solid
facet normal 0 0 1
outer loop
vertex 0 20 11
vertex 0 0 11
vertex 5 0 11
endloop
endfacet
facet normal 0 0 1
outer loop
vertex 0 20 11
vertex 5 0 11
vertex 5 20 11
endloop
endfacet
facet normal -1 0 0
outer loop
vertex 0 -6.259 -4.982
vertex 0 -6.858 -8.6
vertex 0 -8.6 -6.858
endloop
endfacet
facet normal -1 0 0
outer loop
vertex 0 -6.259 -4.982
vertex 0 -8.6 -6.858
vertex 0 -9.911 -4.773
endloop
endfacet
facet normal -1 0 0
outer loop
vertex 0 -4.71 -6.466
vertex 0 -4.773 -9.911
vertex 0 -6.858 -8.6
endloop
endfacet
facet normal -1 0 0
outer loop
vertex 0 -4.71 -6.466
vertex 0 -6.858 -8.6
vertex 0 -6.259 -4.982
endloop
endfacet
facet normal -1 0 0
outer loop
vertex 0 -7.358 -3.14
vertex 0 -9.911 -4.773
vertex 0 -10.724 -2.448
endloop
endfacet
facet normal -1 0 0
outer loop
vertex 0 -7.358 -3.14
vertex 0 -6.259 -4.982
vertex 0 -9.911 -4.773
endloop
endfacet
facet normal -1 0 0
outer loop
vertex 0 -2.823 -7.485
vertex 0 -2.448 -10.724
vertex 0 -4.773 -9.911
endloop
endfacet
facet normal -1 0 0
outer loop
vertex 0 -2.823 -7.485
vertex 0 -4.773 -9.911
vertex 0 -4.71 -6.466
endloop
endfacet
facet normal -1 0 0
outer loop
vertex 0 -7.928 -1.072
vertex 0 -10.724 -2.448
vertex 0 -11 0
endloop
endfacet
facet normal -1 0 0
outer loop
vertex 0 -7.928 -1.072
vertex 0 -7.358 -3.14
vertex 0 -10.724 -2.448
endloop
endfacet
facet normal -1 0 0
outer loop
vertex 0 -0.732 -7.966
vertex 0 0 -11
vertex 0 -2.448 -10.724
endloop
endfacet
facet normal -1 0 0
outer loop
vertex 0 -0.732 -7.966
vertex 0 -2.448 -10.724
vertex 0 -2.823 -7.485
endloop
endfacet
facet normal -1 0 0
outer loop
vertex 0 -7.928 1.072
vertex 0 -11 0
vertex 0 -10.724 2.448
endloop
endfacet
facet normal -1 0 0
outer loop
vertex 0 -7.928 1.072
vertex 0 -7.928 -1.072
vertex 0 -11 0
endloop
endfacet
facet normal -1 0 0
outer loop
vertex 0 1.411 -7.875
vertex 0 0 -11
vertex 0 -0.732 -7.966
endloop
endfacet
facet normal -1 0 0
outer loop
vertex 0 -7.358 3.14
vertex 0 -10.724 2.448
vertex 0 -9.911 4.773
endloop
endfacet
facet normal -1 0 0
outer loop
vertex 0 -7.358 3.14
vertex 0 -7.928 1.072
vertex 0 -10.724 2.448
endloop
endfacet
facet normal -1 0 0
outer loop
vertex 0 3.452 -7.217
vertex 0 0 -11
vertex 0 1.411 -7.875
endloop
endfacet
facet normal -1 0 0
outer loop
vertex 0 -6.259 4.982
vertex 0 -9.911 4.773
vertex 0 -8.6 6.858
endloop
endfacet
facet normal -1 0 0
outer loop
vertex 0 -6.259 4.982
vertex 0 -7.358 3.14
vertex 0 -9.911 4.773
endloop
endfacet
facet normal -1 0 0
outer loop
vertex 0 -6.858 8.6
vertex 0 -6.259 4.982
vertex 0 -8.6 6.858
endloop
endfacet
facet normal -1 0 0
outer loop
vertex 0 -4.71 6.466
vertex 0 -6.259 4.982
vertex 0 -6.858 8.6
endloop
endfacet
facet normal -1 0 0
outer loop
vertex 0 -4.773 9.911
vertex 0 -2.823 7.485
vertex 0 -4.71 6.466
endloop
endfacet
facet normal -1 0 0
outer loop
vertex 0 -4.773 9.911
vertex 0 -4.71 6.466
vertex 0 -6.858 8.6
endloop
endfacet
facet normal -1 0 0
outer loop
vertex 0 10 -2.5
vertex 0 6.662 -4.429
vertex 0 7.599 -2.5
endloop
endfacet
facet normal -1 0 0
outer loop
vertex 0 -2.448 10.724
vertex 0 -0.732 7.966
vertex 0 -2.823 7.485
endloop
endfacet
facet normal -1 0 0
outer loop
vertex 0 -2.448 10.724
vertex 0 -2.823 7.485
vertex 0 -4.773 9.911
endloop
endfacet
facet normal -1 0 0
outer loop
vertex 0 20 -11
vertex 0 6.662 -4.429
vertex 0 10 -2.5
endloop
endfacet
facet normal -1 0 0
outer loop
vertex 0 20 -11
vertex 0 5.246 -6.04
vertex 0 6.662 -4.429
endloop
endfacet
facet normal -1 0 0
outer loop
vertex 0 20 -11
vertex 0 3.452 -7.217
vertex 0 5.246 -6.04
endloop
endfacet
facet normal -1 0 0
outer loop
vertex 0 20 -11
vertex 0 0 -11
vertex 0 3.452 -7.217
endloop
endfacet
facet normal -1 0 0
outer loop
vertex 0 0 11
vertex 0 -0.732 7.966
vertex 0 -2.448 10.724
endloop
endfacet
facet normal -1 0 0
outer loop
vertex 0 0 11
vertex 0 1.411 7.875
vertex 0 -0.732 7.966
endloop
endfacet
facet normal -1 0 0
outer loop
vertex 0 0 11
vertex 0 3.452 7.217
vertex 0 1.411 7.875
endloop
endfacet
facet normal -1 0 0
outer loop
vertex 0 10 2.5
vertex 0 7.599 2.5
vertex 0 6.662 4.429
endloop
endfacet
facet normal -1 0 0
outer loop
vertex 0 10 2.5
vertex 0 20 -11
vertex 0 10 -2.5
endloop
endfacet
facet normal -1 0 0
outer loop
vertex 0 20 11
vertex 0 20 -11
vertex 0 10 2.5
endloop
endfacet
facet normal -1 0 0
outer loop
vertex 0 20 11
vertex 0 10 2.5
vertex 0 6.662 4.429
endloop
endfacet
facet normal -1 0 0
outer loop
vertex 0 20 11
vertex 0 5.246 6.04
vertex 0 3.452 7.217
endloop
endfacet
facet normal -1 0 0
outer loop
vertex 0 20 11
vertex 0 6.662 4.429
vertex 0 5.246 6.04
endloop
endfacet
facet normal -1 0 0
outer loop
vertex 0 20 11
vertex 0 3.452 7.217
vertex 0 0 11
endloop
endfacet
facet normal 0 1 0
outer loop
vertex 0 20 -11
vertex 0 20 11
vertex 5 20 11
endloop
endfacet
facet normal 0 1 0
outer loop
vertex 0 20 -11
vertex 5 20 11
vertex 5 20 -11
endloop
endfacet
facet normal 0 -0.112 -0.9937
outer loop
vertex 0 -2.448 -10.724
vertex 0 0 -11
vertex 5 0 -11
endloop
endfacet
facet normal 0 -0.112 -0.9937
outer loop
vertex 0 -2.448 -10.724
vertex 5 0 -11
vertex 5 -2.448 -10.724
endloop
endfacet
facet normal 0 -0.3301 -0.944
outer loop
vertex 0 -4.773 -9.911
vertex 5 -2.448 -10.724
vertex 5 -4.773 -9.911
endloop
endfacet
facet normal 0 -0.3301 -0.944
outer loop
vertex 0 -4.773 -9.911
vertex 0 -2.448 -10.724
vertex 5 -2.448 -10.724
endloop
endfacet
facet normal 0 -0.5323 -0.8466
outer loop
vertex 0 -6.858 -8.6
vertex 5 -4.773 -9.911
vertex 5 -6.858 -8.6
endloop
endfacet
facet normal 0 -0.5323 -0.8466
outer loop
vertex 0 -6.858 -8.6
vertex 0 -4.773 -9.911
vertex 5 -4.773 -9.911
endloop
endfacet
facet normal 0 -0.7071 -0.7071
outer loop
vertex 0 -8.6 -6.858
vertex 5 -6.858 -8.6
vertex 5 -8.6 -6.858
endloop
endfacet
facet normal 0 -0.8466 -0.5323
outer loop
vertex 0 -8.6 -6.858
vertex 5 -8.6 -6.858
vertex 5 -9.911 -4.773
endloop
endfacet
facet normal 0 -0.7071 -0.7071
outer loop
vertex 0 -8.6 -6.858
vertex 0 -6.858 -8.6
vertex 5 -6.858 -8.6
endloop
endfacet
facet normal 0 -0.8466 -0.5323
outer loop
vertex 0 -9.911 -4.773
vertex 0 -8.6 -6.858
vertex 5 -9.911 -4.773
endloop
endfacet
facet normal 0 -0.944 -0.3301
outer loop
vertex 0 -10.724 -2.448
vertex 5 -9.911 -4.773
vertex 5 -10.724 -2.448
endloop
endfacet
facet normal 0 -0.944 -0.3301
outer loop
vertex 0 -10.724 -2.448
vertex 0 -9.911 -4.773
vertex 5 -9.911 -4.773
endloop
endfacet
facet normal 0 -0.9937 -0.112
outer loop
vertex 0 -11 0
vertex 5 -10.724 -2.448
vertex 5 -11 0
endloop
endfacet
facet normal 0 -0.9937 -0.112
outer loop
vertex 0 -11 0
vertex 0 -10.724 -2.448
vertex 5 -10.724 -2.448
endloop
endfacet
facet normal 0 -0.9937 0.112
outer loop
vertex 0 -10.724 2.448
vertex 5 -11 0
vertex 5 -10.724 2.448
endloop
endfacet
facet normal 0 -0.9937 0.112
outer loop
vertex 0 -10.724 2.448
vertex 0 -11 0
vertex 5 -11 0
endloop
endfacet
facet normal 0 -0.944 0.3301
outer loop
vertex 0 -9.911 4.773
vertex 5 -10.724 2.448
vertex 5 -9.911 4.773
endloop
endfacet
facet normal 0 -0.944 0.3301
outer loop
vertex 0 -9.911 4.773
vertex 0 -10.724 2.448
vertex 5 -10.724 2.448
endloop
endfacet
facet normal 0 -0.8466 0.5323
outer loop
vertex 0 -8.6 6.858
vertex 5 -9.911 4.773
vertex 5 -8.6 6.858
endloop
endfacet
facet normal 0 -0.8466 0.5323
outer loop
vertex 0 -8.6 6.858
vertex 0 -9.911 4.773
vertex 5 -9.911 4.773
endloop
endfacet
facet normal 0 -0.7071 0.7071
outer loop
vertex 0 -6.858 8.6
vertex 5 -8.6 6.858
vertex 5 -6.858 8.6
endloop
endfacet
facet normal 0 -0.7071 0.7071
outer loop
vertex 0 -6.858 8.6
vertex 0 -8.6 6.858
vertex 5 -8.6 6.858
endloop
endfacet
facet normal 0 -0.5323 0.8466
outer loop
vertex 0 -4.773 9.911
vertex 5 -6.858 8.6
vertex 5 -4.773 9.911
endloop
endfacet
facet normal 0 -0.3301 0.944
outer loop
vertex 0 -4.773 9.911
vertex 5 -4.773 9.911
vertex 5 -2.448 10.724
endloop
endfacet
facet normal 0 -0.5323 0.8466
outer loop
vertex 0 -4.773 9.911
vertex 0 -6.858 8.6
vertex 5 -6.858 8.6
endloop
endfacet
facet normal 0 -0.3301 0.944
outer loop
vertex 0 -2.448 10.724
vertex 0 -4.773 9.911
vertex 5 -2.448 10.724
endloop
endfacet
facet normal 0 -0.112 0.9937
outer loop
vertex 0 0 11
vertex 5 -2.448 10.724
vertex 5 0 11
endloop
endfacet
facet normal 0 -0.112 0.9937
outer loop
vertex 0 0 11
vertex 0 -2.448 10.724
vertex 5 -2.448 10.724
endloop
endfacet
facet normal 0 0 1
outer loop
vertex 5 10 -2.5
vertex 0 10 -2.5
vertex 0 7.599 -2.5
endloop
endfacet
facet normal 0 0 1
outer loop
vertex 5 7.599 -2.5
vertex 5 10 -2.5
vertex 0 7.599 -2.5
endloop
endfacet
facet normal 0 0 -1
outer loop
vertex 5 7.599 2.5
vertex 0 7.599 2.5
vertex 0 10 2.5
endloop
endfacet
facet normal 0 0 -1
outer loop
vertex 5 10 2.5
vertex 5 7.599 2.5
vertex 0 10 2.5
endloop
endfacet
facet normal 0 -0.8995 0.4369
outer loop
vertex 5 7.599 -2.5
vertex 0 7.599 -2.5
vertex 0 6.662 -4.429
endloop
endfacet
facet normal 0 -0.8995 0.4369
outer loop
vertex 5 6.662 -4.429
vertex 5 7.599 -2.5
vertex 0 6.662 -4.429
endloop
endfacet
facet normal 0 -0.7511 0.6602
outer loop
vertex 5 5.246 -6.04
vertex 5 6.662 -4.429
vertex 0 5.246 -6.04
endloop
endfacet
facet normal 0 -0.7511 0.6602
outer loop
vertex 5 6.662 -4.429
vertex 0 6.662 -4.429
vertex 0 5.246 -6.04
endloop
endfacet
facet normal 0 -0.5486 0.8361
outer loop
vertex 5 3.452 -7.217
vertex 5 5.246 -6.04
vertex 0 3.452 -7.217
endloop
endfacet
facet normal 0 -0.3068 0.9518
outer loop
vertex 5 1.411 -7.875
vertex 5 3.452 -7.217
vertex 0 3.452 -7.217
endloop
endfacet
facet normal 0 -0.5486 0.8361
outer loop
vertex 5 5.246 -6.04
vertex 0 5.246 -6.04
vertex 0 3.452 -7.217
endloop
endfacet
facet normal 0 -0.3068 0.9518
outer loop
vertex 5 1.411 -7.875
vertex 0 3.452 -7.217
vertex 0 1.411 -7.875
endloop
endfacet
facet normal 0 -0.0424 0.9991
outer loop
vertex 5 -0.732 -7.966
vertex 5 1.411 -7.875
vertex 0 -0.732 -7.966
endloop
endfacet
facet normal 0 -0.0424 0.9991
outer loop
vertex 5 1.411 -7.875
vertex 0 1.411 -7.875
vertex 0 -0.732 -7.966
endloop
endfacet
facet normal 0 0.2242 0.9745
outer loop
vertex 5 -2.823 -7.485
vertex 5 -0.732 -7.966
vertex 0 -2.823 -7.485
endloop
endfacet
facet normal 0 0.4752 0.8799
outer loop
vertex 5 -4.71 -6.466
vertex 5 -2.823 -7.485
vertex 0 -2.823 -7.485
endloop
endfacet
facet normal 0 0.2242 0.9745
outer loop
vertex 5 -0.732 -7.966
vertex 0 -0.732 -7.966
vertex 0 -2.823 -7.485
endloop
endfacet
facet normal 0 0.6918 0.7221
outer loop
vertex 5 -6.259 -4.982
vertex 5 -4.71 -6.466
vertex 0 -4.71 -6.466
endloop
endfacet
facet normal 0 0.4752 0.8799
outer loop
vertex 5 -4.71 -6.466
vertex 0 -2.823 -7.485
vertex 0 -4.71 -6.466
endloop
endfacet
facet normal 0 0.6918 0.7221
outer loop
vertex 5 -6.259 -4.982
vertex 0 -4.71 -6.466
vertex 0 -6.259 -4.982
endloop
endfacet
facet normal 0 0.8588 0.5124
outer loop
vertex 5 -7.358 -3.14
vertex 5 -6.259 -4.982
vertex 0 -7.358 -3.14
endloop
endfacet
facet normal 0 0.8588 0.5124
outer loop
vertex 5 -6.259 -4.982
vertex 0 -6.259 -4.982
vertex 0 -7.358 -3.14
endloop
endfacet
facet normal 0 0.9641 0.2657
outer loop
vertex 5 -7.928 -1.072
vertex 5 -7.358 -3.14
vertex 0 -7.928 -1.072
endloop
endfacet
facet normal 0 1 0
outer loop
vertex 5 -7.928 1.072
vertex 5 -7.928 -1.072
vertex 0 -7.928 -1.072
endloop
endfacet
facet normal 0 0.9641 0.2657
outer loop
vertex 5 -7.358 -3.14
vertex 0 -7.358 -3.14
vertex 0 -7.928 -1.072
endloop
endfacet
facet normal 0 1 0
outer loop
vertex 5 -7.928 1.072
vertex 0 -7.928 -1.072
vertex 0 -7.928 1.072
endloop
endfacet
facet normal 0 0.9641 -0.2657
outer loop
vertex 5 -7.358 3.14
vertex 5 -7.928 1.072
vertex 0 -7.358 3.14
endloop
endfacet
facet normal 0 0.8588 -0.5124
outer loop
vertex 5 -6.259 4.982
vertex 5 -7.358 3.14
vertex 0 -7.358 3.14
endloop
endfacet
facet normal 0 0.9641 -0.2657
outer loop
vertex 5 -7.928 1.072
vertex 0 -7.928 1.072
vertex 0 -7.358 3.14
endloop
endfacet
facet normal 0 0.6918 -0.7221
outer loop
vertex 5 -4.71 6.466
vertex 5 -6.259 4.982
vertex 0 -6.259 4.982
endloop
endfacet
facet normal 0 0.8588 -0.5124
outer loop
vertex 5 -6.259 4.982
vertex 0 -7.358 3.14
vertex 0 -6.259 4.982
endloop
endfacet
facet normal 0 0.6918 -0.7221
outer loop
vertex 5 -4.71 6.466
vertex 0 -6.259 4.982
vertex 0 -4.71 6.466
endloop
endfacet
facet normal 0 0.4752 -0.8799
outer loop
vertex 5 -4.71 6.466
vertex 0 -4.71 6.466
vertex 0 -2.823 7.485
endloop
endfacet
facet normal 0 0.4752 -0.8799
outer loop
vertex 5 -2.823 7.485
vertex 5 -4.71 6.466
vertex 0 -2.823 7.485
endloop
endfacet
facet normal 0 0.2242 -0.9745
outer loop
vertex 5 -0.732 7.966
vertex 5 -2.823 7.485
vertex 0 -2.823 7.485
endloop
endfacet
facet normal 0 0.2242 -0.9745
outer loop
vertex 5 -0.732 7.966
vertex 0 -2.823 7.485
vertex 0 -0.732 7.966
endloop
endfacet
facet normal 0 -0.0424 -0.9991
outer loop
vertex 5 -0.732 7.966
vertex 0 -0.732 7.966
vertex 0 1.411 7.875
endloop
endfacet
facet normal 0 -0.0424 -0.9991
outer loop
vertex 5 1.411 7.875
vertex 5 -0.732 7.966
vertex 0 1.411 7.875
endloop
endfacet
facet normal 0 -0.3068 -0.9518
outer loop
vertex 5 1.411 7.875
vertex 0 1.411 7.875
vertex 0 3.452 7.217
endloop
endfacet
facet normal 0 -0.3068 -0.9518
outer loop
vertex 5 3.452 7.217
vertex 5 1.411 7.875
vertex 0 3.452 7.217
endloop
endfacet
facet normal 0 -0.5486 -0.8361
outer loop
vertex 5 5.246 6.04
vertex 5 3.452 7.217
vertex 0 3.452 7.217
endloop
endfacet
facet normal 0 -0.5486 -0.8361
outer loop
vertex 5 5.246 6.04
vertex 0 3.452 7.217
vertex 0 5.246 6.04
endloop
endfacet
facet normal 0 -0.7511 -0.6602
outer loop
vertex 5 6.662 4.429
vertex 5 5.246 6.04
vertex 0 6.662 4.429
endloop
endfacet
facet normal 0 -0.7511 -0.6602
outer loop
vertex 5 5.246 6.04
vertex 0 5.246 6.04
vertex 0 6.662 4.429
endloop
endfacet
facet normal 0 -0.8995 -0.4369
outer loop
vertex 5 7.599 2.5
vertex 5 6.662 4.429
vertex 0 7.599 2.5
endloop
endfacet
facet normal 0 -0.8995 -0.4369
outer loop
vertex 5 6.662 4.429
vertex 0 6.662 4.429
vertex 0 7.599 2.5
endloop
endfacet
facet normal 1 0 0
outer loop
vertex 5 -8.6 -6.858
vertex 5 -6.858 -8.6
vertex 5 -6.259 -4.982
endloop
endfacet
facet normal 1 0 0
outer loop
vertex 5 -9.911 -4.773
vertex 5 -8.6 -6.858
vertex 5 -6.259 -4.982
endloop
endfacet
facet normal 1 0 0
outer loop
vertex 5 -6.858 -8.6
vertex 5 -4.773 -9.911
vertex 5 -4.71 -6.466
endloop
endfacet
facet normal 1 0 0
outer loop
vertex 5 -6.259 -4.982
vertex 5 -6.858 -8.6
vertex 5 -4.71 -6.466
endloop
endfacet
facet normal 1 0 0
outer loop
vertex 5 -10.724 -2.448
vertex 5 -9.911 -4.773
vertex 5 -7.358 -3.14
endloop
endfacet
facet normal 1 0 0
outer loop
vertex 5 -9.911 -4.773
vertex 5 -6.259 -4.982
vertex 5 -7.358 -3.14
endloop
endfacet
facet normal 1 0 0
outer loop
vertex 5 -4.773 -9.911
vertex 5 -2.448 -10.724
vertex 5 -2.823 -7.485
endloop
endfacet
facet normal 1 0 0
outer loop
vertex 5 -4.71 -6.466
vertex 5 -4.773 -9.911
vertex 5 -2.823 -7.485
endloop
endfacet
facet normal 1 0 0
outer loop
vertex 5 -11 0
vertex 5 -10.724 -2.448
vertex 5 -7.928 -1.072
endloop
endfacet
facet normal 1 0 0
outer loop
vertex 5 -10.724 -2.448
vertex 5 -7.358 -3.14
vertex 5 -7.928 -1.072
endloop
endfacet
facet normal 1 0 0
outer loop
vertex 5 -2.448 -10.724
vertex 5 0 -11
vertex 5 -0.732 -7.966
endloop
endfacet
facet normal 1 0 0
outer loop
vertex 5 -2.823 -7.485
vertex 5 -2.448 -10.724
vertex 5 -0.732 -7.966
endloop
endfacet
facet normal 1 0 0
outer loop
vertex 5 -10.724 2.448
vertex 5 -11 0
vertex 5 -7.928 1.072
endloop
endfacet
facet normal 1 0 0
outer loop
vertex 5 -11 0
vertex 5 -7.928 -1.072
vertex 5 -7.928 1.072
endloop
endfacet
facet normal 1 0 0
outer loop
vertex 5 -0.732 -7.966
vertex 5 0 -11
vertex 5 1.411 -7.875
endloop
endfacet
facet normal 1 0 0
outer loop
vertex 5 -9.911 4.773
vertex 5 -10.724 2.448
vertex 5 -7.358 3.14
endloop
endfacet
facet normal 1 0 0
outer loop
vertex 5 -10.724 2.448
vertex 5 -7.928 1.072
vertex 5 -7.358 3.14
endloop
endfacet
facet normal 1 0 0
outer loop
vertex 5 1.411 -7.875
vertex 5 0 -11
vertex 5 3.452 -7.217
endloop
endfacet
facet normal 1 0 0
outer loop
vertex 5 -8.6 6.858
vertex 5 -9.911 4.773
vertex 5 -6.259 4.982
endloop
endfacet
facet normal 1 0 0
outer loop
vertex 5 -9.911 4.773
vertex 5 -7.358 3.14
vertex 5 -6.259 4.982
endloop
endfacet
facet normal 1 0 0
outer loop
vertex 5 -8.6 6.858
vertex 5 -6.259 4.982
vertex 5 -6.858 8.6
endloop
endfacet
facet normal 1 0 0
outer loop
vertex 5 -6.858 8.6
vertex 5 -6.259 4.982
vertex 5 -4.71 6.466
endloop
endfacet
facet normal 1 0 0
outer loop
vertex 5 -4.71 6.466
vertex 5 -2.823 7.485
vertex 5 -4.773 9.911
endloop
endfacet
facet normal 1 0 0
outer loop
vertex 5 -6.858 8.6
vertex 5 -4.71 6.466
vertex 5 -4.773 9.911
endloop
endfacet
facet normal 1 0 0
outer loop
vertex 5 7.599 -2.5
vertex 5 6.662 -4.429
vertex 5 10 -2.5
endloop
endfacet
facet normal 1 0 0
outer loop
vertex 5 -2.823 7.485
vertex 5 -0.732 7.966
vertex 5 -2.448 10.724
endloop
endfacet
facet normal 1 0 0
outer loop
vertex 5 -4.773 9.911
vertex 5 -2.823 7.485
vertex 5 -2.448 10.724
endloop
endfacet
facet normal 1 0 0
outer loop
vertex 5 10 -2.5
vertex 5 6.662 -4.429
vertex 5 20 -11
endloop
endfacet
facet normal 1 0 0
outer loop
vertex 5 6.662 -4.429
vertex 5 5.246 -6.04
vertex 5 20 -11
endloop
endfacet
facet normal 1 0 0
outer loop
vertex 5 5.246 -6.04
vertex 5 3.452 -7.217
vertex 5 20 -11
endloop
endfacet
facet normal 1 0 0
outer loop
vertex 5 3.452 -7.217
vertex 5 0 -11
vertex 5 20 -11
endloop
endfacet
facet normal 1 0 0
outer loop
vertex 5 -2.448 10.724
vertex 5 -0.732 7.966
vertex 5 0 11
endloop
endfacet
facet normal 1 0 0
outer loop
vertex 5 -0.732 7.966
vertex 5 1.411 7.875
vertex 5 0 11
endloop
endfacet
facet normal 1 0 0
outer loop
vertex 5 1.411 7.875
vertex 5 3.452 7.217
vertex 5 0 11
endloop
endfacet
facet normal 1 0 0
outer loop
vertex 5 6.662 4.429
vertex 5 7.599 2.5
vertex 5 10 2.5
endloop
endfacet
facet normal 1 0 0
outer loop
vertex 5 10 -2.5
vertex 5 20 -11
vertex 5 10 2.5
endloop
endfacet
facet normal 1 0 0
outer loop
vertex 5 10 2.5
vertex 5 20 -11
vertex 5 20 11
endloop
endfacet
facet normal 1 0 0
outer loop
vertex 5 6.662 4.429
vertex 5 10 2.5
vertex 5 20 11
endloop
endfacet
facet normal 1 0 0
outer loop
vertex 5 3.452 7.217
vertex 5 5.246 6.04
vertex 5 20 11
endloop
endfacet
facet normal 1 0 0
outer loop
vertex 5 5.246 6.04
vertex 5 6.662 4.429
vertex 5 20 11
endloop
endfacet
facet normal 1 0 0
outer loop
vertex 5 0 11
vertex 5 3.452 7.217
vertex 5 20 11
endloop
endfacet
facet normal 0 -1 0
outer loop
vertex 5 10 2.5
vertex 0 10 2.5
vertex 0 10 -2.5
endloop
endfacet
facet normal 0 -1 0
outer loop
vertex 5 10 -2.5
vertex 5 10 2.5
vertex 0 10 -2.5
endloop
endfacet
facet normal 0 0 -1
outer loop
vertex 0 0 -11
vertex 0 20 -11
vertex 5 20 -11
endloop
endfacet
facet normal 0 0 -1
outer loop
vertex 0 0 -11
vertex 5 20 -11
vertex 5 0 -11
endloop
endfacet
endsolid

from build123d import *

# Parameters (mm, degrees)
BOSS_EXTRUDE1_DEPTH = 5


with BuildPart() as part:
    # Sketch1 → Boss-Extrude1 (new body)
    with BuildSketch(Plane(origin=(0, 0, 0), x_dir=(0, 0, -1), z_dir=(1, 0, 0))):
        with BuildLine():
            Line((-11, 0), (-11, 20))
            Line((-11, 20), (11, 20))
            Line((11, 20), (11, 0))
            ThreePointArc((11, 0), (0, -11), (-11, 0))
        make_face()
        with BuildLine():
            Line((-2.5, 10), (2.5, 10))
            Line((2.5, 10), (2.5, 7.599342077))
            ThreePointArc((2.5, 7.599342077), (0, -8), (-2.5, 7.599342077))
            Line((-2.5, 7.599342077), (-2.5, 10))
        make_face(mode=Mode.SUBTRACT)
    extrude(amount=BOSS_EXTRUDE1_DEPTH)


solid = part.part
